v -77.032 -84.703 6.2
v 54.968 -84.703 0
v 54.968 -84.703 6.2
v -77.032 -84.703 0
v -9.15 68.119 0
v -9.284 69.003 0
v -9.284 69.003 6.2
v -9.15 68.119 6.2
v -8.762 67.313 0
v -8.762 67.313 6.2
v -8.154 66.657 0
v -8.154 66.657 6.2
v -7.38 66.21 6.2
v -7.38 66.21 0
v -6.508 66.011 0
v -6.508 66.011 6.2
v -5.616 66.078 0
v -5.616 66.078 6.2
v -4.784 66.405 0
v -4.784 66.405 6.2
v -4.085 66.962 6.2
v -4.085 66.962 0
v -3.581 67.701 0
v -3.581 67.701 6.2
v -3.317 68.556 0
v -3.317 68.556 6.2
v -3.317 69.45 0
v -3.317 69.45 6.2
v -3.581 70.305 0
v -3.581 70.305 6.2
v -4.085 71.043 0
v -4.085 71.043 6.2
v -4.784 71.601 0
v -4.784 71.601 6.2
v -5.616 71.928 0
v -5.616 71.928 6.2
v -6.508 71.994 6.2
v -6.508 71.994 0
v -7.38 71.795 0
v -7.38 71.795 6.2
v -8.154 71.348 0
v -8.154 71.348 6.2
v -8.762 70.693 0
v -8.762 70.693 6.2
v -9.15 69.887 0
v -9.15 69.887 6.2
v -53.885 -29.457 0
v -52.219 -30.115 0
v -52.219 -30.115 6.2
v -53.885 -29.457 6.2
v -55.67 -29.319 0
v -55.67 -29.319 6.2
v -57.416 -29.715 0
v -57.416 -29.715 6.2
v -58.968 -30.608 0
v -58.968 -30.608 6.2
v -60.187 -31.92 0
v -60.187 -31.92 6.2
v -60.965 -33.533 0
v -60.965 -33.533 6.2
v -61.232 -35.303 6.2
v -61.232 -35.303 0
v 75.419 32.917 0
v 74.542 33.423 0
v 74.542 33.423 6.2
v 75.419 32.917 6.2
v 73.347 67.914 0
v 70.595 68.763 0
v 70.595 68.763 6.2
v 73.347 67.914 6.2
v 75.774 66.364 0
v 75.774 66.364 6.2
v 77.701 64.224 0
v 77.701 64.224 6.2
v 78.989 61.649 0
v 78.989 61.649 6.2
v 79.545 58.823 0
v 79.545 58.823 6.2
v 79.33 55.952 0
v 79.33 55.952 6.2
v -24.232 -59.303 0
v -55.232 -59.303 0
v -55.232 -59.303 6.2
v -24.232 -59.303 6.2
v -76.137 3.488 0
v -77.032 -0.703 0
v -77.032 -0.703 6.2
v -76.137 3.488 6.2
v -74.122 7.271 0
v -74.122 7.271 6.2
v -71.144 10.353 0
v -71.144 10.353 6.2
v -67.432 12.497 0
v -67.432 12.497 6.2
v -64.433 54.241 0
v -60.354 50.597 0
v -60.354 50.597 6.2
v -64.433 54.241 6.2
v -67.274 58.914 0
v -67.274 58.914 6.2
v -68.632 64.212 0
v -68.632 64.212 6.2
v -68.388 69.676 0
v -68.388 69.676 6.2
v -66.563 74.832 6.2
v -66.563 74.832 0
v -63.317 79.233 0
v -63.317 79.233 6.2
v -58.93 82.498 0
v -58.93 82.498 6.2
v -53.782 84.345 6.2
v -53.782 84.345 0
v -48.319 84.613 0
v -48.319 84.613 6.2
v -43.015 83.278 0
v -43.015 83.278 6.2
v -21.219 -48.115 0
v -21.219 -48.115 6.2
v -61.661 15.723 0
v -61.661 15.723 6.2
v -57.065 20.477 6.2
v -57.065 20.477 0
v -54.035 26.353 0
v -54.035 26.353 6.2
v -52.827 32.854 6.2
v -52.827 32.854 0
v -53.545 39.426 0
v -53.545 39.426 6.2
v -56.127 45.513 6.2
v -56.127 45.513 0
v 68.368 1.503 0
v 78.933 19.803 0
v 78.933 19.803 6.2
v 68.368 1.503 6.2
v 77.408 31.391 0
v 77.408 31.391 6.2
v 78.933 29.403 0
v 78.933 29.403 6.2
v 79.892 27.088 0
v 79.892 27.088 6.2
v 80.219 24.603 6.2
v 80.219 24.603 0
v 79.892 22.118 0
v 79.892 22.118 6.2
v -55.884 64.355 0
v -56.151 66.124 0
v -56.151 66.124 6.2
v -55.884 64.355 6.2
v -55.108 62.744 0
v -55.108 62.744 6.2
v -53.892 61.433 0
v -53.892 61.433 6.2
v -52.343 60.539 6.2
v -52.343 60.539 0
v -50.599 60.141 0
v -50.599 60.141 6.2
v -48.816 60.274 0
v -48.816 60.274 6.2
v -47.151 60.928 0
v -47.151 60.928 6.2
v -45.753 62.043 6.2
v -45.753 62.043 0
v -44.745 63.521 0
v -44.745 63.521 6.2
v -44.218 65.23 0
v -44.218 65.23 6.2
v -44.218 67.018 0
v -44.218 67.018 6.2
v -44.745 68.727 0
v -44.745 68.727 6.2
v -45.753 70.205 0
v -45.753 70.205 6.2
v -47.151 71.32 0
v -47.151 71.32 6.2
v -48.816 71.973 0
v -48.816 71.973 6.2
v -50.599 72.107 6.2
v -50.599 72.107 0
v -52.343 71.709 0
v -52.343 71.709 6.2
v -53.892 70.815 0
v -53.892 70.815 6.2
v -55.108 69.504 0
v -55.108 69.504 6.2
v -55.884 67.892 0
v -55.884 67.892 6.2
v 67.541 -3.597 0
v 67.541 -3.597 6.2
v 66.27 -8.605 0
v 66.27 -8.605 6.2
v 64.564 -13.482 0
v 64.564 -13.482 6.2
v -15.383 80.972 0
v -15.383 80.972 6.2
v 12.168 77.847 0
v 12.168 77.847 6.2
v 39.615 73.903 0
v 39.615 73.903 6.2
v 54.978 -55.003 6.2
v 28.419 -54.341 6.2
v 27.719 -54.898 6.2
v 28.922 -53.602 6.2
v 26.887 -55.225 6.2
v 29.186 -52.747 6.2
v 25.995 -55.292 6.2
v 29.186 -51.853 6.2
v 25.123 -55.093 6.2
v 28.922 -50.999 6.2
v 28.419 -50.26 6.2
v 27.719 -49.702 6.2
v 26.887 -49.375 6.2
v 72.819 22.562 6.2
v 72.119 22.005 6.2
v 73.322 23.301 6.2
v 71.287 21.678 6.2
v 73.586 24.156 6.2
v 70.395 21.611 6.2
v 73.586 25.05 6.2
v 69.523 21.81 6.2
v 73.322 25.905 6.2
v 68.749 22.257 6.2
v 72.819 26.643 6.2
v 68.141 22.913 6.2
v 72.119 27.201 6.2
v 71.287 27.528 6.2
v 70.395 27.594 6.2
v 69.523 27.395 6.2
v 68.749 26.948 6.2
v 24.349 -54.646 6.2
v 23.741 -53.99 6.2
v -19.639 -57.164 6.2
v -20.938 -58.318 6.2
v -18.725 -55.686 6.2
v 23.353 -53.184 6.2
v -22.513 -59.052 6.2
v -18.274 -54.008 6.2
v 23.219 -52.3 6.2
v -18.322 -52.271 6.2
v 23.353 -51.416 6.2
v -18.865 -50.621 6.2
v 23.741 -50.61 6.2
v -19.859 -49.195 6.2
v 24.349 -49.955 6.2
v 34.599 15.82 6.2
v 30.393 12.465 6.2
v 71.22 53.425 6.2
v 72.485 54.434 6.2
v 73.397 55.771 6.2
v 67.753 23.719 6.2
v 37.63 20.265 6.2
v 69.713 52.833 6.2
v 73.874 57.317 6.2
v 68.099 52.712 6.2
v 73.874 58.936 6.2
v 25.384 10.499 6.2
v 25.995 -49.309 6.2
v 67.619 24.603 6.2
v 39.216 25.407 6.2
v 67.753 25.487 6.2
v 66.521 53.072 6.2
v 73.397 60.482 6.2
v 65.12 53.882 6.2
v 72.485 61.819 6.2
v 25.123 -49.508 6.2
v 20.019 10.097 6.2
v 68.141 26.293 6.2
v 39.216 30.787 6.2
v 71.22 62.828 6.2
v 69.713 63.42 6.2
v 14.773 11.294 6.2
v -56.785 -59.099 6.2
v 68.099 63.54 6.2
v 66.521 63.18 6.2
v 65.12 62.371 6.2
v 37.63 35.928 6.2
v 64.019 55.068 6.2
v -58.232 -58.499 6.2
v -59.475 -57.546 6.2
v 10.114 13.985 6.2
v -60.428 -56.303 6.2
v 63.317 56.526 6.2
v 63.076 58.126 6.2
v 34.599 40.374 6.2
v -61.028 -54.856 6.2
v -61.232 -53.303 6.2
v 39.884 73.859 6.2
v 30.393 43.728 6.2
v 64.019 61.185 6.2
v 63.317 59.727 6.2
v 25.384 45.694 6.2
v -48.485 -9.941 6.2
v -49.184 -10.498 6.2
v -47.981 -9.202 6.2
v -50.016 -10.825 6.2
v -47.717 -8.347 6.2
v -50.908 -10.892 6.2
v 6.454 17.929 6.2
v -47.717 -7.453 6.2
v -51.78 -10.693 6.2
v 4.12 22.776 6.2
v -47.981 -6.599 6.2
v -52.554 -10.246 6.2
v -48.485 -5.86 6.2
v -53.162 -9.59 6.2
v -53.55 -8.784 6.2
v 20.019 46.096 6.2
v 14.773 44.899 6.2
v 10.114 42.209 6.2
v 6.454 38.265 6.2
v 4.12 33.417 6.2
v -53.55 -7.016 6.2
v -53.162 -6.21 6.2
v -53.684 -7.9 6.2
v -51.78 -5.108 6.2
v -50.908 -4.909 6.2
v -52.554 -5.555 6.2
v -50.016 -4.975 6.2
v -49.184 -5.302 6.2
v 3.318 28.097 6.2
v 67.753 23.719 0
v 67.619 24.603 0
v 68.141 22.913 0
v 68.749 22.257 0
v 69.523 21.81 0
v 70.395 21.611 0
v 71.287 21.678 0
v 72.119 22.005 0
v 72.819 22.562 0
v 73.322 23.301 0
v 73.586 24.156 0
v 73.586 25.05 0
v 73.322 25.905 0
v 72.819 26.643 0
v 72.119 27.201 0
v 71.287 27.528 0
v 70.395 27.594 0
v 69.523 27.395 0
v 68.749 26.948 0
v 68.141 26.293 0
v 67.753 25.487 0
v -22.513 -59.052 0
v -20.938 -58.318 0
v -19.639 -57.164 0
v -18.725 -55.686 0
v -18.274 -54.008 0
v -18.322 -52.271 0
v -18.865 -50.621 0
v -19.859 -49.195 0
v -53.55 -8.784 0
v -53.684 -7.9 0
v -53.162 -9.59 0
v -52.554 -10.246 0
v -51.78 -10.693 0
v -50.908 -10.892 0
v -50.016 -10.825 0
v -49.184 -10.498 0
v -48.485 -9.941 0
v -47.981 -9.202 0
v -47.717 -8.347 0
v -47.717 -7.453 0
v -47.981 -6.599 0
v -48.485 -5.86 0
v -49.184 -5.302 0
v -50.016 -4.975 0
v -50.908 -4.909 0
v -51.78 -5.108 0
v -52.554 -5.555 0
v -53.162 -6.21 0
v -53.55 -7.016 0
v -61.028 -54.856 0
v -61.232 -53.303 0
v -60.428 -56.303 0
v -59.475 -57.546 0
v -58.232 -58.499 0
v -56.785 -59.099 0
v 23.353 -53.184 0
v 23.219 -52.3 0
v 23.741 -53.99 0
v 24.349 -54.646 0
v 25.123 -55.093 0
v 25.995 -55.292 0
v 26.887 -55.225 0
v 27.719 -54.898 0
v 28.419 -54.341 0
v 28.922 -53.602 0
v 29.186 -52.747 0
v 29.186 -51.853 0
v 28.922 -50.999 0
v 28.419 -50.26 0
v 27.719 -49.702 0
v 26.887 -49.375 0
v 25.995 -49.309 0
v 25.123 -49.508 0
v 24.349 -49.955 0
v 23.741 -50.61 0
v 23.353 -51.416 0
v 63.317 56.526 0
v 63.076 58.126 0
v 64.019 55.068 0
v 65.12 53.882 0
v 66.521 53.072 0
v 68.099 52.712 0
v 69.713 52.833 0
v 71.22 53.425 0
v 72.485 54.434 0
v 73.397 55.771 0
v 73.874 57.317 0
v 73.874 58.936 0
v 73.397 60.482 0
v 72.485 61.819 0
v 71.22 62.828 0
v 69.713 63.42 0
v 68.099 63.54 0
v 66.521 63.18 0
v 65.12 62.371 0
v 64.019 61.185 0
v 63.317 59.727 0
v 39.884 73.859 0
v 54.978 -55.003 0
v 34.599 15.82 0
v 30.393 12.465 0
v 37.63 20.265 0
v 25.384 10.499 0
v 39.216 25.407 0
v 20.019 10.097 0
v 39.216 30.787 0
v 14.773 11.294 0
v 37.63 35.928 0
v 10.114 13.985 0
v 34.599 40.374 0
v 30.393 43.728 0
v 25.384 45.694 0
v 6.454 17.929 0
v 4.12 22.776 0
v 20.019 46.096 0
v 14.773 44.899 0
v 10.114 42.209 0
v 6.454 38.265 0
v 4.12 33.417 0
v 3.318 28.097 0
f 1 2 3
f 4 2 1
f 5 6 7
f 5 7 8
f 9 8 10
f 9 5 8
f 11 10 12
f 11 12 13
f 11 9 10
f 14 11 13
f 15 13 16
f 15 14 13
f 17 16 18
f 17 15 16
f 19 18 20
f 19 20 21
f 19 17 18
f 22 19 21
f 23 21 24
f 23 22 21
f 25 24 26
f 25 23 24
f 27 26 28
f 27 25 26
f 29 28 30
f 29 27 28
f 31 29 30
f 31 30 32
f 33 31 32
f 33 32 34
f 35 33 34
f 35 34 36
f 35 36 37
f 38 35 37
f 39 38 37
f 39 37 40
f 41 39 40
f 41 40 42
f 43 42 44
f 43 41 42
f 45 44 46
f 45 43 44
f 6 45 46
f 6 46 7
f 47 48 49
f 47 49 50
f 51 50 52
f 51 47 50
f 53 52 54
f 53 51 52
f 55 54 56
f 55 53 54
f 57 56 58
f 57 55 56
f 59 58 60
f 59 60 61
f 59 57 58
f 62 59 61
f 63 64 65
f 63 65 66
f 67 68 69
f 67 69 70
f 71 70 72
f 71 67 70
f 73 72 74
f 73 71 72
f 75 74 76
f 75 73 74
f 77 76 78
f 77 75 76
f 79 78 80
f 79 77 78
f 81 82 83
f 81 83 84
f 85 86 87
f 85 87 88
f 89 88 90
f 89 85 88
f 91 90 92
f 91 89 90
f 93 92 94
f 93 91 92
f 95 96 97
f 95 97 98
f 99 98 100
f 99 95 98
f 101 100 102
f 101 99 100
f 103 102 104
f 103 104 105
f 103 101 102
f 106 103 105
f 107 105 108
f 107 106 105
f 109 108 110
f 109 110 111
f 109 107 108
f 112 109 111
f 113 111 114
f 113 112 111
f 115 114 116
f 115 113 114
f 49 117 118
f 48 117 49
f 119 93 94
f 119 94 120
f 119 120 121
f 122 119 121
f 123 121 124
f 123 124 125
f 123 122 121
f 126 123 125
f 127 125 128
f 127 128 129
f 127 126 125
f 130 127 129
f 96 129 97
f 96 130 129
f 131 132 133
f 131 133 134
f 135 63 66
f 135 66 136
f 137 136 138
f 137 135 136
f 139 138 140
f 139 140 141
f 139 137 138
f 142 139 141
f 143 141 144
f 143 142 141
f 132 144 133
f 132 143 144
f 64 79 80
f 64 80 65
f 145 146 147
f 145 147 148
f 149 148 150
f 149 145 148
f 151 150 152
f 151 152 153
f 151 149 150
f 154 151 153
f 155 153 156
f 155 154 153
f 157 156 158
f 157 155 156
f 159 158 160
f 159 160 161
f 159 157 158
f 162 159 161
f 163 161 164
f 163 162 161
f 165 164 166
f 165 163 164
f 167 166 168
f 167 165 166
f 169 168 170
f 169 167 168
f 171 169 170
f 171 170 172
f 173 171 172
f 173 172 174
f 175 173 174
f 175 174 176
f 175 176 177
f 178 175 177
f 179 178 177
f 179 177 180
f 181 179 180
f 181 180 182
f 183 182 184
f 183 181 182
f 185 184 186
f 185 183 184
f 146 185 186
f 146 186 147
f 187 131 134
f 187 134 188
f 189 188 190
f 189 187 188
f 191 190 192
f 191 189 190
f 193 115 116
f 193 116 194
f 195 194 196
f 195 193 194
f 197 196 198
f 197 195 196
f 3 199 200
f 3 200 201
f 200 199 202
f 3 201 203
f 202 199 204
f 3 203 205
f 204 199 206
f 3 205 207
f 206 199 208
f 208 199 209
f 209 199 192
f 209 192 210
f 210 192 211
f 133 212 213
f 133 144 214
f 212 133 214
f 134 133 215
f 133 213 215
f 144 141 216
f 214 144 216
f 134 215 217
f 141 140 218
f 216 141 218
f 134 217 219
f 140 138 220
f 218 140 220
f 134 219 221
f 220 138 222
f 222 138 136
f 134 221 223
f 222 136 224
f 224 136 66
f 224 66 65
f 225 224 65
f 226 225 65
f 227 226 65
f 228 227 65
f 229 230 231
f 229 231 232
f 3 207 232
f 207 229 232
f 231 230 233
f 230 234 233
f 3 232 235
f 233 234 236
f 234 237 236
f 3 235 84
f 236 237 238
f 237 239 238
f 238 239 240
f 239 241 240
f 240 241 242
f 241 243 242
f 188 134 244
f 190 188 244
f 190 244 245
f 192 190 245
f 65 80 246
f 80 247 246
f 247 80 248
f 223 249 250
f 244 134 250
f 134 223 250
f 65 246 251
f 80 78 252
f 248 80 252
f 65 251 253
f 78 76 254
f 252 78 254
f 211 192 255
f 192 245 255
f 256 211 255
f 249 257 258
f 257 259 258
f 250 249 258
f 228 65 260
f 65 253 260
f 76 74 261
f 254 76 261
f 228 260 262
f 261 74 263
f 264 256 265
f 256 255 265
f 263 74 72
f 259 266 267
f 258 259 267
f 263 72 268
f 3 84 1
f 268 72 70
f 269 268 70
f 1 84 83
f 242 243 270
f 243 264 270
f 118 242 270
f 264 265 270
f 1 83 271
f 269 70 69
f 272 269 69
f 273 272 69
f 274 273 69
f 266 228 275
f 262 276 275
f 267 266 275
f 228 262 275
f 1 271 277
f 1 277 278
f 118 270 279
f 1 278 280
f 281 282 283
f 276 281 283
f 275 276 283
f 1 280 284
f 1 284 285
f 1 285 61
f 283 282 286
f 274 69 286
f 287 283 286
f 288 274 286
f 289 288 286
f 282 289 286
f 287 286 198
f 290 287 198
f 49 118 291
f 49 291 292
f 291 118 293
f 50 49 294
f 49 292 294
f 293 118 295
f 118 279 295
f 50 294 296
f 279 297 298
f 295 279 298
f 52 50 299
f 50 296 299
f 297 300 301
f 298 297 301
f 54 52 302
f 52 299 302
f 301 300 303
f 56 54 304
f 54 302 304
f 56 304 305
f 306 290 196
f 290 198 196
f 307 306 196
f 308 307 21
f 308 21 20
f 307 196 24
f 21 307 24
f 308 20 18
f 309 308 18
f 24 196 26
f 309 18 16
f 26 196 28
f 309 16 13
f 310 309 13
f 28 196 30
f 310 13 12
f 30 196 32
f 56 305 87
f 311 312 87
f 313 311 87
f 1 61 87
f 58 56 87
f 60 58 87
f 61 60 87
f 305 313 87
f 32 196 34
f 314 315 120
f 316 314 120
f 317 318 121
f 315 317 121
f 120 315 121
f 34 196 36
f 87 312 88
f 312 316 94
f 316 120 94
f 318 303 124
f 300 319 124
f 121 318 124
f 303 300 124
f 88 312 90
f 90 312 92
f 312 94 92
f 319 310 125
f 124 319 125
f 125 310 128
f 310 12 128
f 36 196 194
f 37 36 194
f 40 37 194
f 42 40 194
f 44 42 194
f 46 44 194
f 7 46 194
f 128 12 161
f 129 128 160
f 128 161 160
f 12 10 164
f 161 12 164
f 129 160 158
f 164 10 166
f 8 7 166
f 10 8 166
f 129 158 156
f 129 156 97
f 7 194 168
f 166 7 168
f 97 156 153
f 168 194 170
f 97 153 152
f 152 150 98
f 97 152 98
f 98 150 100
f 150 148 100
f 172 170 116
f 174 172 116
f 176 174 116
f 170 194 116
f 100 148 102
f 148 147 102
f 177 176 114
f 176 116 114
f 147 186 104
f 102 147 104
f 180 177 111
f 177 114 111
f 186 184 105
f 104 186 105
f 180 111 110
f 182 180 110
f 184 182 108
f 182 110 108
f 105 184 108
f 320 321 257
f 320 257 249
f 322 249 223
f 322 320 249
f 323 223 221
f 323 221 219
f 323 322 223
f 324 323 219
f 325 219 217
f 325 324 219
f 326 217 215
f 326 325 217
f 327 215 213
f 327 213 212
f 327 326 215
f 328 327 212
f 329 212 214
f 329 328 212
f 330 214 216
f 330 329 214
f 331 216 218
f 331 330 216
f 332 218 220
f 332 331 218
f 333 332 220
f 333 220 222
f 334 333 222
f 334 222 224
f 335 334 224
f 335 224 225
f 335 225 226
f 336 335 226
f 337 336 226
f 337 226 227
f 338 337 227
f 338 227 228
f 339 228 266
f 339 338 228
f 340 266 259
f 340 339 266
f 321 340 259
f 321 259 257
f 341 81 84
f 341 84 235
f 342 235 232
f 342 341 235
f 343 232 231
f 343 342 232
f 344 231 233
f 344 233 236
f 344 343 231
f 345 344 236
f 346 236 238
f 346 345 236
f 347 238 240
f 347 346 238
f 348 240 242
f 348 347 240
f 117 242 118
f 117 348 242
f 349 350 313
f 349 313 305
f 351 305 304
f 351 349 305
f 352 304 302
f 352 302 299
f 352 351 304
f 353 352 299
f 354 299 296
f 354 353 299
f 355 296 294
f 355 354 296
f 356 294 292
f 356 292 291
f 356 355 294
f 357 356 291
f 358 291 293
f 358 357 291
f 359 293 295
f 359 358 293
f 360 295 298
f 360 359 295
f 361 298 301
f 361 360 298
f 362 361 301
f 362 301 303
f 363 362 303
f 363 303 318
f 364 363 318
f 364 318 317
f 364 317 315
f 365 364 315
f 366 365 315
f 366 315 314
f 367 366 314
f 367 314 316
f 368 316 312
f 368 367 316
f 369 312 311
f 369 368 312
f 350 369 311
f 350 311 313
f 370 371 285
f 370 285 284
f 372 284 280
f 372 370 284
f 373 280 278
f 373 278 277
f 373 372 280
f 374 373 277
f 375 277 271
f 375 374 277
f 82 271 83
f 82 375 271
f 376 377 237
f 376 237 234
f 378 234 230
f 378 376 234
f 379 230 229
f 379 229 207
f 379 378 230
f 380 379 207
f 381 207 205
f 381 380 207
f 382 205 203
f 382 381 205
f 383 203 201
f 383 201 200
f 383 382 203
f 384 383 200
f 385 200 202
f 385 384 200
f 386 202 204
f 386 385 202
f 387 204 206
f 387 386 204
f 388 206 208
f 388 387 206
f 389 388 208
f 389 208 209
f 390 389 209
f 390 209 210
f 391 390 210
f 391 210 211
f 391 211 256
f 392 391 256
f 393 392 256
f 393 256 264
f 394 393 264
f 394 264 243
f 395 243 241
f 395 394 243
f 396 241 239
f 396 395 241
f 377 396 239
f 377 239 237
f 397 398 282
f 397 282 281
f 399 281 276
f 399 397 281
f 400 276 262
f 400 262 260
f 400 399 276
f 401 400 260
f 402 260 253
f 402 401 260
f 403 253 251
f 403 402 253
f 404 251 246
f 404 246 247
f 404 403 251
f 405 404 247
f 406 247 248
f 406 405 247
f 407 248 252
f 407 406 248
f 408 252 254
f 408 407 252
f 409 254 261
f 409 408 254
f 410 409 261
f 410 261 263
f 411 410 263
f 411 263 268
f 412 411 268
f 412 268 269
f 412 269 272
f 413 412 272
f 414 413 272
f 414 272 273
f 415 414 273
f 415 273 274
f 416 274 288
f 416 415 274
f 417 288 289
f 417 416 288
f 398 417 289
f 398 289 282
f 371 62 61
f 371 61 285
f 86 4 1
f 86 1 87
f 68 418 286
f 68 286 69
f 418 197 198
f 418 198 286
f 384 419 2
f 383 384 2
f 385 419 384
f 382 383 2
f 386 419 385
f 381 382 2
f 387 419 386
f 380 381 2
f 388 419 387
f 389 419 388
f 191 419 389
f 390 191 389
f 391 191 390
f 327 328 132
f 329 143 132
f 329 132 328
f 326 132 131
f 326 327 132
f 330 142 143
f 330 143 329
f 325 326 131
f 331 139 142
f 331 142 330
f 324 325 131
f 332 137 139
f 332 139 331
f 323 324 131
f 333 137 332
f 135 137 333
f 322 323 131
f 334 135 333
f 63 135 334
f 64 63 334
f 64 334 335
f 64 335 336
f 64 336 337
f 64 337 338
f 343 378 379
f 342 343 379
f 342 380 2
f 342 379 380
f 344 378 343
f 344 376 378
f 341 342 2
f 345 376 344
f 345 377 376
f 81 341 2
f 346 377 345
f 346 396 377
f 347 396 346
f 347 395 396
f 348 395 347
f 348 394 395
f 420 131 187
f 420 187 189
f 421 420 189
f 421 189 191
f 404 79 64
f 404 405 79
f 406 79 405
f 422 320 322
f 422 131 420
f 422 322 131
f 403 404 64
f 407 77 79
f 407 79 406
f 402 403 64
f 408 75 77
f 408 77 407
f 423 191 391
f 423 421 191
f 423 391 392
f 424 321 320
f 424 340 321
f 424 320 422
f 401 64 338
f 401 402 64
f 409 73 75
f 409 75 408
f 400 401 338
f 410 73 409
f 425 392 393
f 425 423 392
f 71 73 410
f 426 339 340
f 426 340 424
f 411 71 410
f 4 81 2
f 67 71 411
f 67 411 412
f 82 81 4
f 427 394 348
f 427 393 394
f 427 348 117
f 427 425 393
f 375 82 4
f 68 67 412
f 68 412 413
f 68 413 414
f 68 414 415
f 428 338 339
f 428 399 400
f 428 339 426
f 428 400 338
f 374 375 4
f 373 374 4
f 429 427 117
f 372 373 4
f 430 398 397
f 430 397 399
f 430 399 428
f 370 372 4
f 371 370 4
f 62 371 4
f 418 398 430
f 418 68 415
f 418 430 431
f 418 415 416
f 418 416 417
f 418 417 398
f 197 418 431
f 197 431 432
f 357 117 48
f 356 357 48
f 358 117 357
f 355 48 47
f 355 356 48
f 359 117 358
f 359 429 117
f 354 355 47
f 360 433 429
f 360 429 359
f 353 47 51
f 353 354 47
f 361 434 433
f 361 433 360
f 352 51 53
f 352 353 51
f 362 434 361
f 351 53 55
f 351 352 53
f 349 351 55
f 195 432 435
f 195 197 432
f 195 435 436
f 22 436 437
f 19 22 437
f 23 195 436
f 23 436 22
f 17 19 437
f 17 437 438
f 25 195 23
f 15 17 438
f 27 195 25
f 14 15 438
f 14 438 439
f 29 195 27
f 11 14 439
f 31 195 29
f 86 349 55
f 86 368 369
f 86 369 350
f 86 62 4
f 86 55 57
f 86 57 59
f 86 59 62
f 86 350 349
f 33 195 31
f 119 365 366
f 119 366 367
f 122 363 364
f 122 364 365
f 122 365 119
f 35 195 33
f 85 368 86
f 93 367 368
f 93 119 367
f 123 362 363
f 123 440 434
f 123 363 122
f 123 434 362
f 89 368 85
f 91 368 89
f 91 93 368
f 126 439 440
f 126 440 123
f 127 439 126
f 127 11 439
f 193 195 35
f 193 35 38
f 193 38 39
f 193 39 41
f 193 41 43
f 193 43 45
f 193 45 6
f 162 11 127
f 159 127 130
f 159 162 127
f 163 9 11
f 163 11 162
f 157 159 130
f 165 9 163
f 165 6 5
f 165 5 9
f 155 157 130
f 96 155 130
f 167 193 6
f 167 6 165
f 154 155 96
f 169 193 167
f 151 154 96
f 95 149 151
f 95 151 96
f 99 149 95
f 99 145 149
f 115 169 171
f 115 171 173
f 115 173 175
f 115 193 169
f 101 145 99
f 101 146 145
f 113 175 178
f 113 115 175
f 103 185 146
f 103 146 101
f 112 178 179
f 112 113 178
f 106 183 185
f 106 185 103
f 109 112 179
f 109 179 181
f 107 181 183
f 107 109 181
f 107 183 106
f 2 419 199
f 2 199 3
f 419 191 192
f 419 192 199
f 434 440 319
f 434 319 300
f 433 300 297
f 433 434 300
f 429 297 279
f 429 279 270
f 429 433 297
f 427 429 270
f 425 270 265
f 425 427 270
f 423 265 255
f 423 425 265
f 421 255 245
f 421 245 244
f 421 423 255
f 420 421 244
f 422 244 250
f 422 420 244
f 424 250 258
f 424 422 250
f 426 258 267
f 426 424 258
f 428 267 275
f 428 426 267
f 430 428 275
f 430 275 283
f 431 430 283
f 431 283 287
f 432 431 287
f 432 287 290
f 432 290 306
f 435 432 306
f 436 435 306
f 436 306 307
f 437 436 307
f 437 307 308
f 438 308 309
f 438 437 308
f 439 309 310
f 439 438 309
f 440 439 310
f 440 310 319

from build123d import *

# Parameters (mm, degrees)
SKETCH1_R           = 5.42927296
SKETCH1_R_2         = 5.999999996
SKETCH1_R_3         = 3
SKETCH1_R_4         = 18.05
BOSS_EXTRUDE1_DEPTH = 6.2


with BuildPart() as part:
    # Sketch1 → Boss-Extrude1 (new body)
    with BuildSketch(Plane.XY):
        with BuildLine():
            Line((39.614582687, 73.90348608), (39.884157083, 73.858752771))
            Line((39.884157083, 73.858752771), (70.59488962, 68.762598575))
            ThreePointArc((70.59488962, 68.762598575), (77.700603566, 64.224178317), (79.330264302, 55.951776308))
            Line((79.330264302, 55.951776308), (74.541718965, 33.423432184))
            Line((74.541718965, 33.423432184), (75.419376917, 32.916716129))
            ThreePointArc((75.419376917, 32.916716129), (79.892264849, 27.087535086), (78.933220793, 19.802872253))
            Line((78.933220793, 19.802872253), (68.367652451, 1.502771074))
            ThreePointArc((68.367652451, 1.502771074), (66.960524587, -6.114993434), (64.564182125, -13.481667564))
            Line((64.564182125, -13.481667564), (54.978164866, -55.003255407))
            Line((54.978164866, -55.003255407), (54.967848993, -84.703266118))
            Line((54.967848993, -84.703266118), (-77.032151007, -84.703266118))
            Line((-77.032151007, -84.703266118), (-77.032151007, -52.303266118))
            Line((-77.032151007, -52.303266118), (-77.032151007, -0.703266118))
            ThreePointArc((-77.032151007, -0.703266118), (-74.12202184, 7.271185396), (-67.432151007, 12.496733882))
            ThreePointArc((-67.432151007, 12.496733882), (-53.19307052, 29.559194605), (-60.354355055, 50.597136112))
            ThreePointArc((-60.354355055, 50.597136112), (-66.563388034, 74.831521387), (-43.015404957, 83.278415086))
            ThreePointArc((-43.015404957, 83.278415086), (-1.595924432, 79.511889283), (39.614582687, 73.90348608))
        make_face()
        with Locations(Location((68.504996686, 58.126398509, 0), (0, 0, 180))):
            Circle(SKETCH1_R, mode=Mode.SUBTRACT)
        with Locations(Location((-50.150905711, 66.123930347, 0), (0, 0, 180))):
            Circle(SKETCH1_R_2, mode=Mode.SUBTRACT)
        with Locations(Location((-6.283678939, 69.002872253, 0), (0, 0, 180))):
            Circle(SKETCH1_R_3, mode=Mode.SUBTRACT)
        with Locations(Location((26.219376917, -52.300183603, 0), (0, 0, 180))):
            Circle(SKETCH1_R_3, mode=Mode.SUBTRACT)
        with Locations(Location((70.619376917, 24.602872253, 0), (0, 0, 180))):
            Circle(SKETCH1_R_3, mode=Mode.SUBTRACT)
        with Locations(Location((-50.683678939, -7.900183603, 0), (0, 0, 180))):
            Circle(SKETCH1_R_3, mode=Mode.SUBTRACT)
        with Locations(Location((21.367848989, 28.096723532, 0), (0, 0, 180))):
            Circle(SKETCH1_R_4, mode=Mode.SUBTRACT)
        with BuildLine():
            ThreePointArc((-24.232151011, -59.303276516), (-18.438516483, -54.863340285), (-21.219337907, -48.114542837))
            Line((-21.219337907, -48.114542837), (-52.219337907, -30.114542837))
            ThreePointArc((-52.219337907, -30.114542837), (-58.225737603, -30.103426585), (-61.232151011, -35.303276516))
            Line((-61.232151011, -35.303276516), (-61.232151011, -53.303276516))
            ThreePointArc((-61.232151011, -53.303276516), (-59.474791698, -57.545917204), (-55.232151011, -59.303276516))
            Line((-55.232151011, -59.303276516), (-24.232151011, -59.303276516))
        make_face(mode=Mode.SUBTRACT)
    extrude(amount=BOSS_EXTRUDE1_DEPTH)


solid = part.part
